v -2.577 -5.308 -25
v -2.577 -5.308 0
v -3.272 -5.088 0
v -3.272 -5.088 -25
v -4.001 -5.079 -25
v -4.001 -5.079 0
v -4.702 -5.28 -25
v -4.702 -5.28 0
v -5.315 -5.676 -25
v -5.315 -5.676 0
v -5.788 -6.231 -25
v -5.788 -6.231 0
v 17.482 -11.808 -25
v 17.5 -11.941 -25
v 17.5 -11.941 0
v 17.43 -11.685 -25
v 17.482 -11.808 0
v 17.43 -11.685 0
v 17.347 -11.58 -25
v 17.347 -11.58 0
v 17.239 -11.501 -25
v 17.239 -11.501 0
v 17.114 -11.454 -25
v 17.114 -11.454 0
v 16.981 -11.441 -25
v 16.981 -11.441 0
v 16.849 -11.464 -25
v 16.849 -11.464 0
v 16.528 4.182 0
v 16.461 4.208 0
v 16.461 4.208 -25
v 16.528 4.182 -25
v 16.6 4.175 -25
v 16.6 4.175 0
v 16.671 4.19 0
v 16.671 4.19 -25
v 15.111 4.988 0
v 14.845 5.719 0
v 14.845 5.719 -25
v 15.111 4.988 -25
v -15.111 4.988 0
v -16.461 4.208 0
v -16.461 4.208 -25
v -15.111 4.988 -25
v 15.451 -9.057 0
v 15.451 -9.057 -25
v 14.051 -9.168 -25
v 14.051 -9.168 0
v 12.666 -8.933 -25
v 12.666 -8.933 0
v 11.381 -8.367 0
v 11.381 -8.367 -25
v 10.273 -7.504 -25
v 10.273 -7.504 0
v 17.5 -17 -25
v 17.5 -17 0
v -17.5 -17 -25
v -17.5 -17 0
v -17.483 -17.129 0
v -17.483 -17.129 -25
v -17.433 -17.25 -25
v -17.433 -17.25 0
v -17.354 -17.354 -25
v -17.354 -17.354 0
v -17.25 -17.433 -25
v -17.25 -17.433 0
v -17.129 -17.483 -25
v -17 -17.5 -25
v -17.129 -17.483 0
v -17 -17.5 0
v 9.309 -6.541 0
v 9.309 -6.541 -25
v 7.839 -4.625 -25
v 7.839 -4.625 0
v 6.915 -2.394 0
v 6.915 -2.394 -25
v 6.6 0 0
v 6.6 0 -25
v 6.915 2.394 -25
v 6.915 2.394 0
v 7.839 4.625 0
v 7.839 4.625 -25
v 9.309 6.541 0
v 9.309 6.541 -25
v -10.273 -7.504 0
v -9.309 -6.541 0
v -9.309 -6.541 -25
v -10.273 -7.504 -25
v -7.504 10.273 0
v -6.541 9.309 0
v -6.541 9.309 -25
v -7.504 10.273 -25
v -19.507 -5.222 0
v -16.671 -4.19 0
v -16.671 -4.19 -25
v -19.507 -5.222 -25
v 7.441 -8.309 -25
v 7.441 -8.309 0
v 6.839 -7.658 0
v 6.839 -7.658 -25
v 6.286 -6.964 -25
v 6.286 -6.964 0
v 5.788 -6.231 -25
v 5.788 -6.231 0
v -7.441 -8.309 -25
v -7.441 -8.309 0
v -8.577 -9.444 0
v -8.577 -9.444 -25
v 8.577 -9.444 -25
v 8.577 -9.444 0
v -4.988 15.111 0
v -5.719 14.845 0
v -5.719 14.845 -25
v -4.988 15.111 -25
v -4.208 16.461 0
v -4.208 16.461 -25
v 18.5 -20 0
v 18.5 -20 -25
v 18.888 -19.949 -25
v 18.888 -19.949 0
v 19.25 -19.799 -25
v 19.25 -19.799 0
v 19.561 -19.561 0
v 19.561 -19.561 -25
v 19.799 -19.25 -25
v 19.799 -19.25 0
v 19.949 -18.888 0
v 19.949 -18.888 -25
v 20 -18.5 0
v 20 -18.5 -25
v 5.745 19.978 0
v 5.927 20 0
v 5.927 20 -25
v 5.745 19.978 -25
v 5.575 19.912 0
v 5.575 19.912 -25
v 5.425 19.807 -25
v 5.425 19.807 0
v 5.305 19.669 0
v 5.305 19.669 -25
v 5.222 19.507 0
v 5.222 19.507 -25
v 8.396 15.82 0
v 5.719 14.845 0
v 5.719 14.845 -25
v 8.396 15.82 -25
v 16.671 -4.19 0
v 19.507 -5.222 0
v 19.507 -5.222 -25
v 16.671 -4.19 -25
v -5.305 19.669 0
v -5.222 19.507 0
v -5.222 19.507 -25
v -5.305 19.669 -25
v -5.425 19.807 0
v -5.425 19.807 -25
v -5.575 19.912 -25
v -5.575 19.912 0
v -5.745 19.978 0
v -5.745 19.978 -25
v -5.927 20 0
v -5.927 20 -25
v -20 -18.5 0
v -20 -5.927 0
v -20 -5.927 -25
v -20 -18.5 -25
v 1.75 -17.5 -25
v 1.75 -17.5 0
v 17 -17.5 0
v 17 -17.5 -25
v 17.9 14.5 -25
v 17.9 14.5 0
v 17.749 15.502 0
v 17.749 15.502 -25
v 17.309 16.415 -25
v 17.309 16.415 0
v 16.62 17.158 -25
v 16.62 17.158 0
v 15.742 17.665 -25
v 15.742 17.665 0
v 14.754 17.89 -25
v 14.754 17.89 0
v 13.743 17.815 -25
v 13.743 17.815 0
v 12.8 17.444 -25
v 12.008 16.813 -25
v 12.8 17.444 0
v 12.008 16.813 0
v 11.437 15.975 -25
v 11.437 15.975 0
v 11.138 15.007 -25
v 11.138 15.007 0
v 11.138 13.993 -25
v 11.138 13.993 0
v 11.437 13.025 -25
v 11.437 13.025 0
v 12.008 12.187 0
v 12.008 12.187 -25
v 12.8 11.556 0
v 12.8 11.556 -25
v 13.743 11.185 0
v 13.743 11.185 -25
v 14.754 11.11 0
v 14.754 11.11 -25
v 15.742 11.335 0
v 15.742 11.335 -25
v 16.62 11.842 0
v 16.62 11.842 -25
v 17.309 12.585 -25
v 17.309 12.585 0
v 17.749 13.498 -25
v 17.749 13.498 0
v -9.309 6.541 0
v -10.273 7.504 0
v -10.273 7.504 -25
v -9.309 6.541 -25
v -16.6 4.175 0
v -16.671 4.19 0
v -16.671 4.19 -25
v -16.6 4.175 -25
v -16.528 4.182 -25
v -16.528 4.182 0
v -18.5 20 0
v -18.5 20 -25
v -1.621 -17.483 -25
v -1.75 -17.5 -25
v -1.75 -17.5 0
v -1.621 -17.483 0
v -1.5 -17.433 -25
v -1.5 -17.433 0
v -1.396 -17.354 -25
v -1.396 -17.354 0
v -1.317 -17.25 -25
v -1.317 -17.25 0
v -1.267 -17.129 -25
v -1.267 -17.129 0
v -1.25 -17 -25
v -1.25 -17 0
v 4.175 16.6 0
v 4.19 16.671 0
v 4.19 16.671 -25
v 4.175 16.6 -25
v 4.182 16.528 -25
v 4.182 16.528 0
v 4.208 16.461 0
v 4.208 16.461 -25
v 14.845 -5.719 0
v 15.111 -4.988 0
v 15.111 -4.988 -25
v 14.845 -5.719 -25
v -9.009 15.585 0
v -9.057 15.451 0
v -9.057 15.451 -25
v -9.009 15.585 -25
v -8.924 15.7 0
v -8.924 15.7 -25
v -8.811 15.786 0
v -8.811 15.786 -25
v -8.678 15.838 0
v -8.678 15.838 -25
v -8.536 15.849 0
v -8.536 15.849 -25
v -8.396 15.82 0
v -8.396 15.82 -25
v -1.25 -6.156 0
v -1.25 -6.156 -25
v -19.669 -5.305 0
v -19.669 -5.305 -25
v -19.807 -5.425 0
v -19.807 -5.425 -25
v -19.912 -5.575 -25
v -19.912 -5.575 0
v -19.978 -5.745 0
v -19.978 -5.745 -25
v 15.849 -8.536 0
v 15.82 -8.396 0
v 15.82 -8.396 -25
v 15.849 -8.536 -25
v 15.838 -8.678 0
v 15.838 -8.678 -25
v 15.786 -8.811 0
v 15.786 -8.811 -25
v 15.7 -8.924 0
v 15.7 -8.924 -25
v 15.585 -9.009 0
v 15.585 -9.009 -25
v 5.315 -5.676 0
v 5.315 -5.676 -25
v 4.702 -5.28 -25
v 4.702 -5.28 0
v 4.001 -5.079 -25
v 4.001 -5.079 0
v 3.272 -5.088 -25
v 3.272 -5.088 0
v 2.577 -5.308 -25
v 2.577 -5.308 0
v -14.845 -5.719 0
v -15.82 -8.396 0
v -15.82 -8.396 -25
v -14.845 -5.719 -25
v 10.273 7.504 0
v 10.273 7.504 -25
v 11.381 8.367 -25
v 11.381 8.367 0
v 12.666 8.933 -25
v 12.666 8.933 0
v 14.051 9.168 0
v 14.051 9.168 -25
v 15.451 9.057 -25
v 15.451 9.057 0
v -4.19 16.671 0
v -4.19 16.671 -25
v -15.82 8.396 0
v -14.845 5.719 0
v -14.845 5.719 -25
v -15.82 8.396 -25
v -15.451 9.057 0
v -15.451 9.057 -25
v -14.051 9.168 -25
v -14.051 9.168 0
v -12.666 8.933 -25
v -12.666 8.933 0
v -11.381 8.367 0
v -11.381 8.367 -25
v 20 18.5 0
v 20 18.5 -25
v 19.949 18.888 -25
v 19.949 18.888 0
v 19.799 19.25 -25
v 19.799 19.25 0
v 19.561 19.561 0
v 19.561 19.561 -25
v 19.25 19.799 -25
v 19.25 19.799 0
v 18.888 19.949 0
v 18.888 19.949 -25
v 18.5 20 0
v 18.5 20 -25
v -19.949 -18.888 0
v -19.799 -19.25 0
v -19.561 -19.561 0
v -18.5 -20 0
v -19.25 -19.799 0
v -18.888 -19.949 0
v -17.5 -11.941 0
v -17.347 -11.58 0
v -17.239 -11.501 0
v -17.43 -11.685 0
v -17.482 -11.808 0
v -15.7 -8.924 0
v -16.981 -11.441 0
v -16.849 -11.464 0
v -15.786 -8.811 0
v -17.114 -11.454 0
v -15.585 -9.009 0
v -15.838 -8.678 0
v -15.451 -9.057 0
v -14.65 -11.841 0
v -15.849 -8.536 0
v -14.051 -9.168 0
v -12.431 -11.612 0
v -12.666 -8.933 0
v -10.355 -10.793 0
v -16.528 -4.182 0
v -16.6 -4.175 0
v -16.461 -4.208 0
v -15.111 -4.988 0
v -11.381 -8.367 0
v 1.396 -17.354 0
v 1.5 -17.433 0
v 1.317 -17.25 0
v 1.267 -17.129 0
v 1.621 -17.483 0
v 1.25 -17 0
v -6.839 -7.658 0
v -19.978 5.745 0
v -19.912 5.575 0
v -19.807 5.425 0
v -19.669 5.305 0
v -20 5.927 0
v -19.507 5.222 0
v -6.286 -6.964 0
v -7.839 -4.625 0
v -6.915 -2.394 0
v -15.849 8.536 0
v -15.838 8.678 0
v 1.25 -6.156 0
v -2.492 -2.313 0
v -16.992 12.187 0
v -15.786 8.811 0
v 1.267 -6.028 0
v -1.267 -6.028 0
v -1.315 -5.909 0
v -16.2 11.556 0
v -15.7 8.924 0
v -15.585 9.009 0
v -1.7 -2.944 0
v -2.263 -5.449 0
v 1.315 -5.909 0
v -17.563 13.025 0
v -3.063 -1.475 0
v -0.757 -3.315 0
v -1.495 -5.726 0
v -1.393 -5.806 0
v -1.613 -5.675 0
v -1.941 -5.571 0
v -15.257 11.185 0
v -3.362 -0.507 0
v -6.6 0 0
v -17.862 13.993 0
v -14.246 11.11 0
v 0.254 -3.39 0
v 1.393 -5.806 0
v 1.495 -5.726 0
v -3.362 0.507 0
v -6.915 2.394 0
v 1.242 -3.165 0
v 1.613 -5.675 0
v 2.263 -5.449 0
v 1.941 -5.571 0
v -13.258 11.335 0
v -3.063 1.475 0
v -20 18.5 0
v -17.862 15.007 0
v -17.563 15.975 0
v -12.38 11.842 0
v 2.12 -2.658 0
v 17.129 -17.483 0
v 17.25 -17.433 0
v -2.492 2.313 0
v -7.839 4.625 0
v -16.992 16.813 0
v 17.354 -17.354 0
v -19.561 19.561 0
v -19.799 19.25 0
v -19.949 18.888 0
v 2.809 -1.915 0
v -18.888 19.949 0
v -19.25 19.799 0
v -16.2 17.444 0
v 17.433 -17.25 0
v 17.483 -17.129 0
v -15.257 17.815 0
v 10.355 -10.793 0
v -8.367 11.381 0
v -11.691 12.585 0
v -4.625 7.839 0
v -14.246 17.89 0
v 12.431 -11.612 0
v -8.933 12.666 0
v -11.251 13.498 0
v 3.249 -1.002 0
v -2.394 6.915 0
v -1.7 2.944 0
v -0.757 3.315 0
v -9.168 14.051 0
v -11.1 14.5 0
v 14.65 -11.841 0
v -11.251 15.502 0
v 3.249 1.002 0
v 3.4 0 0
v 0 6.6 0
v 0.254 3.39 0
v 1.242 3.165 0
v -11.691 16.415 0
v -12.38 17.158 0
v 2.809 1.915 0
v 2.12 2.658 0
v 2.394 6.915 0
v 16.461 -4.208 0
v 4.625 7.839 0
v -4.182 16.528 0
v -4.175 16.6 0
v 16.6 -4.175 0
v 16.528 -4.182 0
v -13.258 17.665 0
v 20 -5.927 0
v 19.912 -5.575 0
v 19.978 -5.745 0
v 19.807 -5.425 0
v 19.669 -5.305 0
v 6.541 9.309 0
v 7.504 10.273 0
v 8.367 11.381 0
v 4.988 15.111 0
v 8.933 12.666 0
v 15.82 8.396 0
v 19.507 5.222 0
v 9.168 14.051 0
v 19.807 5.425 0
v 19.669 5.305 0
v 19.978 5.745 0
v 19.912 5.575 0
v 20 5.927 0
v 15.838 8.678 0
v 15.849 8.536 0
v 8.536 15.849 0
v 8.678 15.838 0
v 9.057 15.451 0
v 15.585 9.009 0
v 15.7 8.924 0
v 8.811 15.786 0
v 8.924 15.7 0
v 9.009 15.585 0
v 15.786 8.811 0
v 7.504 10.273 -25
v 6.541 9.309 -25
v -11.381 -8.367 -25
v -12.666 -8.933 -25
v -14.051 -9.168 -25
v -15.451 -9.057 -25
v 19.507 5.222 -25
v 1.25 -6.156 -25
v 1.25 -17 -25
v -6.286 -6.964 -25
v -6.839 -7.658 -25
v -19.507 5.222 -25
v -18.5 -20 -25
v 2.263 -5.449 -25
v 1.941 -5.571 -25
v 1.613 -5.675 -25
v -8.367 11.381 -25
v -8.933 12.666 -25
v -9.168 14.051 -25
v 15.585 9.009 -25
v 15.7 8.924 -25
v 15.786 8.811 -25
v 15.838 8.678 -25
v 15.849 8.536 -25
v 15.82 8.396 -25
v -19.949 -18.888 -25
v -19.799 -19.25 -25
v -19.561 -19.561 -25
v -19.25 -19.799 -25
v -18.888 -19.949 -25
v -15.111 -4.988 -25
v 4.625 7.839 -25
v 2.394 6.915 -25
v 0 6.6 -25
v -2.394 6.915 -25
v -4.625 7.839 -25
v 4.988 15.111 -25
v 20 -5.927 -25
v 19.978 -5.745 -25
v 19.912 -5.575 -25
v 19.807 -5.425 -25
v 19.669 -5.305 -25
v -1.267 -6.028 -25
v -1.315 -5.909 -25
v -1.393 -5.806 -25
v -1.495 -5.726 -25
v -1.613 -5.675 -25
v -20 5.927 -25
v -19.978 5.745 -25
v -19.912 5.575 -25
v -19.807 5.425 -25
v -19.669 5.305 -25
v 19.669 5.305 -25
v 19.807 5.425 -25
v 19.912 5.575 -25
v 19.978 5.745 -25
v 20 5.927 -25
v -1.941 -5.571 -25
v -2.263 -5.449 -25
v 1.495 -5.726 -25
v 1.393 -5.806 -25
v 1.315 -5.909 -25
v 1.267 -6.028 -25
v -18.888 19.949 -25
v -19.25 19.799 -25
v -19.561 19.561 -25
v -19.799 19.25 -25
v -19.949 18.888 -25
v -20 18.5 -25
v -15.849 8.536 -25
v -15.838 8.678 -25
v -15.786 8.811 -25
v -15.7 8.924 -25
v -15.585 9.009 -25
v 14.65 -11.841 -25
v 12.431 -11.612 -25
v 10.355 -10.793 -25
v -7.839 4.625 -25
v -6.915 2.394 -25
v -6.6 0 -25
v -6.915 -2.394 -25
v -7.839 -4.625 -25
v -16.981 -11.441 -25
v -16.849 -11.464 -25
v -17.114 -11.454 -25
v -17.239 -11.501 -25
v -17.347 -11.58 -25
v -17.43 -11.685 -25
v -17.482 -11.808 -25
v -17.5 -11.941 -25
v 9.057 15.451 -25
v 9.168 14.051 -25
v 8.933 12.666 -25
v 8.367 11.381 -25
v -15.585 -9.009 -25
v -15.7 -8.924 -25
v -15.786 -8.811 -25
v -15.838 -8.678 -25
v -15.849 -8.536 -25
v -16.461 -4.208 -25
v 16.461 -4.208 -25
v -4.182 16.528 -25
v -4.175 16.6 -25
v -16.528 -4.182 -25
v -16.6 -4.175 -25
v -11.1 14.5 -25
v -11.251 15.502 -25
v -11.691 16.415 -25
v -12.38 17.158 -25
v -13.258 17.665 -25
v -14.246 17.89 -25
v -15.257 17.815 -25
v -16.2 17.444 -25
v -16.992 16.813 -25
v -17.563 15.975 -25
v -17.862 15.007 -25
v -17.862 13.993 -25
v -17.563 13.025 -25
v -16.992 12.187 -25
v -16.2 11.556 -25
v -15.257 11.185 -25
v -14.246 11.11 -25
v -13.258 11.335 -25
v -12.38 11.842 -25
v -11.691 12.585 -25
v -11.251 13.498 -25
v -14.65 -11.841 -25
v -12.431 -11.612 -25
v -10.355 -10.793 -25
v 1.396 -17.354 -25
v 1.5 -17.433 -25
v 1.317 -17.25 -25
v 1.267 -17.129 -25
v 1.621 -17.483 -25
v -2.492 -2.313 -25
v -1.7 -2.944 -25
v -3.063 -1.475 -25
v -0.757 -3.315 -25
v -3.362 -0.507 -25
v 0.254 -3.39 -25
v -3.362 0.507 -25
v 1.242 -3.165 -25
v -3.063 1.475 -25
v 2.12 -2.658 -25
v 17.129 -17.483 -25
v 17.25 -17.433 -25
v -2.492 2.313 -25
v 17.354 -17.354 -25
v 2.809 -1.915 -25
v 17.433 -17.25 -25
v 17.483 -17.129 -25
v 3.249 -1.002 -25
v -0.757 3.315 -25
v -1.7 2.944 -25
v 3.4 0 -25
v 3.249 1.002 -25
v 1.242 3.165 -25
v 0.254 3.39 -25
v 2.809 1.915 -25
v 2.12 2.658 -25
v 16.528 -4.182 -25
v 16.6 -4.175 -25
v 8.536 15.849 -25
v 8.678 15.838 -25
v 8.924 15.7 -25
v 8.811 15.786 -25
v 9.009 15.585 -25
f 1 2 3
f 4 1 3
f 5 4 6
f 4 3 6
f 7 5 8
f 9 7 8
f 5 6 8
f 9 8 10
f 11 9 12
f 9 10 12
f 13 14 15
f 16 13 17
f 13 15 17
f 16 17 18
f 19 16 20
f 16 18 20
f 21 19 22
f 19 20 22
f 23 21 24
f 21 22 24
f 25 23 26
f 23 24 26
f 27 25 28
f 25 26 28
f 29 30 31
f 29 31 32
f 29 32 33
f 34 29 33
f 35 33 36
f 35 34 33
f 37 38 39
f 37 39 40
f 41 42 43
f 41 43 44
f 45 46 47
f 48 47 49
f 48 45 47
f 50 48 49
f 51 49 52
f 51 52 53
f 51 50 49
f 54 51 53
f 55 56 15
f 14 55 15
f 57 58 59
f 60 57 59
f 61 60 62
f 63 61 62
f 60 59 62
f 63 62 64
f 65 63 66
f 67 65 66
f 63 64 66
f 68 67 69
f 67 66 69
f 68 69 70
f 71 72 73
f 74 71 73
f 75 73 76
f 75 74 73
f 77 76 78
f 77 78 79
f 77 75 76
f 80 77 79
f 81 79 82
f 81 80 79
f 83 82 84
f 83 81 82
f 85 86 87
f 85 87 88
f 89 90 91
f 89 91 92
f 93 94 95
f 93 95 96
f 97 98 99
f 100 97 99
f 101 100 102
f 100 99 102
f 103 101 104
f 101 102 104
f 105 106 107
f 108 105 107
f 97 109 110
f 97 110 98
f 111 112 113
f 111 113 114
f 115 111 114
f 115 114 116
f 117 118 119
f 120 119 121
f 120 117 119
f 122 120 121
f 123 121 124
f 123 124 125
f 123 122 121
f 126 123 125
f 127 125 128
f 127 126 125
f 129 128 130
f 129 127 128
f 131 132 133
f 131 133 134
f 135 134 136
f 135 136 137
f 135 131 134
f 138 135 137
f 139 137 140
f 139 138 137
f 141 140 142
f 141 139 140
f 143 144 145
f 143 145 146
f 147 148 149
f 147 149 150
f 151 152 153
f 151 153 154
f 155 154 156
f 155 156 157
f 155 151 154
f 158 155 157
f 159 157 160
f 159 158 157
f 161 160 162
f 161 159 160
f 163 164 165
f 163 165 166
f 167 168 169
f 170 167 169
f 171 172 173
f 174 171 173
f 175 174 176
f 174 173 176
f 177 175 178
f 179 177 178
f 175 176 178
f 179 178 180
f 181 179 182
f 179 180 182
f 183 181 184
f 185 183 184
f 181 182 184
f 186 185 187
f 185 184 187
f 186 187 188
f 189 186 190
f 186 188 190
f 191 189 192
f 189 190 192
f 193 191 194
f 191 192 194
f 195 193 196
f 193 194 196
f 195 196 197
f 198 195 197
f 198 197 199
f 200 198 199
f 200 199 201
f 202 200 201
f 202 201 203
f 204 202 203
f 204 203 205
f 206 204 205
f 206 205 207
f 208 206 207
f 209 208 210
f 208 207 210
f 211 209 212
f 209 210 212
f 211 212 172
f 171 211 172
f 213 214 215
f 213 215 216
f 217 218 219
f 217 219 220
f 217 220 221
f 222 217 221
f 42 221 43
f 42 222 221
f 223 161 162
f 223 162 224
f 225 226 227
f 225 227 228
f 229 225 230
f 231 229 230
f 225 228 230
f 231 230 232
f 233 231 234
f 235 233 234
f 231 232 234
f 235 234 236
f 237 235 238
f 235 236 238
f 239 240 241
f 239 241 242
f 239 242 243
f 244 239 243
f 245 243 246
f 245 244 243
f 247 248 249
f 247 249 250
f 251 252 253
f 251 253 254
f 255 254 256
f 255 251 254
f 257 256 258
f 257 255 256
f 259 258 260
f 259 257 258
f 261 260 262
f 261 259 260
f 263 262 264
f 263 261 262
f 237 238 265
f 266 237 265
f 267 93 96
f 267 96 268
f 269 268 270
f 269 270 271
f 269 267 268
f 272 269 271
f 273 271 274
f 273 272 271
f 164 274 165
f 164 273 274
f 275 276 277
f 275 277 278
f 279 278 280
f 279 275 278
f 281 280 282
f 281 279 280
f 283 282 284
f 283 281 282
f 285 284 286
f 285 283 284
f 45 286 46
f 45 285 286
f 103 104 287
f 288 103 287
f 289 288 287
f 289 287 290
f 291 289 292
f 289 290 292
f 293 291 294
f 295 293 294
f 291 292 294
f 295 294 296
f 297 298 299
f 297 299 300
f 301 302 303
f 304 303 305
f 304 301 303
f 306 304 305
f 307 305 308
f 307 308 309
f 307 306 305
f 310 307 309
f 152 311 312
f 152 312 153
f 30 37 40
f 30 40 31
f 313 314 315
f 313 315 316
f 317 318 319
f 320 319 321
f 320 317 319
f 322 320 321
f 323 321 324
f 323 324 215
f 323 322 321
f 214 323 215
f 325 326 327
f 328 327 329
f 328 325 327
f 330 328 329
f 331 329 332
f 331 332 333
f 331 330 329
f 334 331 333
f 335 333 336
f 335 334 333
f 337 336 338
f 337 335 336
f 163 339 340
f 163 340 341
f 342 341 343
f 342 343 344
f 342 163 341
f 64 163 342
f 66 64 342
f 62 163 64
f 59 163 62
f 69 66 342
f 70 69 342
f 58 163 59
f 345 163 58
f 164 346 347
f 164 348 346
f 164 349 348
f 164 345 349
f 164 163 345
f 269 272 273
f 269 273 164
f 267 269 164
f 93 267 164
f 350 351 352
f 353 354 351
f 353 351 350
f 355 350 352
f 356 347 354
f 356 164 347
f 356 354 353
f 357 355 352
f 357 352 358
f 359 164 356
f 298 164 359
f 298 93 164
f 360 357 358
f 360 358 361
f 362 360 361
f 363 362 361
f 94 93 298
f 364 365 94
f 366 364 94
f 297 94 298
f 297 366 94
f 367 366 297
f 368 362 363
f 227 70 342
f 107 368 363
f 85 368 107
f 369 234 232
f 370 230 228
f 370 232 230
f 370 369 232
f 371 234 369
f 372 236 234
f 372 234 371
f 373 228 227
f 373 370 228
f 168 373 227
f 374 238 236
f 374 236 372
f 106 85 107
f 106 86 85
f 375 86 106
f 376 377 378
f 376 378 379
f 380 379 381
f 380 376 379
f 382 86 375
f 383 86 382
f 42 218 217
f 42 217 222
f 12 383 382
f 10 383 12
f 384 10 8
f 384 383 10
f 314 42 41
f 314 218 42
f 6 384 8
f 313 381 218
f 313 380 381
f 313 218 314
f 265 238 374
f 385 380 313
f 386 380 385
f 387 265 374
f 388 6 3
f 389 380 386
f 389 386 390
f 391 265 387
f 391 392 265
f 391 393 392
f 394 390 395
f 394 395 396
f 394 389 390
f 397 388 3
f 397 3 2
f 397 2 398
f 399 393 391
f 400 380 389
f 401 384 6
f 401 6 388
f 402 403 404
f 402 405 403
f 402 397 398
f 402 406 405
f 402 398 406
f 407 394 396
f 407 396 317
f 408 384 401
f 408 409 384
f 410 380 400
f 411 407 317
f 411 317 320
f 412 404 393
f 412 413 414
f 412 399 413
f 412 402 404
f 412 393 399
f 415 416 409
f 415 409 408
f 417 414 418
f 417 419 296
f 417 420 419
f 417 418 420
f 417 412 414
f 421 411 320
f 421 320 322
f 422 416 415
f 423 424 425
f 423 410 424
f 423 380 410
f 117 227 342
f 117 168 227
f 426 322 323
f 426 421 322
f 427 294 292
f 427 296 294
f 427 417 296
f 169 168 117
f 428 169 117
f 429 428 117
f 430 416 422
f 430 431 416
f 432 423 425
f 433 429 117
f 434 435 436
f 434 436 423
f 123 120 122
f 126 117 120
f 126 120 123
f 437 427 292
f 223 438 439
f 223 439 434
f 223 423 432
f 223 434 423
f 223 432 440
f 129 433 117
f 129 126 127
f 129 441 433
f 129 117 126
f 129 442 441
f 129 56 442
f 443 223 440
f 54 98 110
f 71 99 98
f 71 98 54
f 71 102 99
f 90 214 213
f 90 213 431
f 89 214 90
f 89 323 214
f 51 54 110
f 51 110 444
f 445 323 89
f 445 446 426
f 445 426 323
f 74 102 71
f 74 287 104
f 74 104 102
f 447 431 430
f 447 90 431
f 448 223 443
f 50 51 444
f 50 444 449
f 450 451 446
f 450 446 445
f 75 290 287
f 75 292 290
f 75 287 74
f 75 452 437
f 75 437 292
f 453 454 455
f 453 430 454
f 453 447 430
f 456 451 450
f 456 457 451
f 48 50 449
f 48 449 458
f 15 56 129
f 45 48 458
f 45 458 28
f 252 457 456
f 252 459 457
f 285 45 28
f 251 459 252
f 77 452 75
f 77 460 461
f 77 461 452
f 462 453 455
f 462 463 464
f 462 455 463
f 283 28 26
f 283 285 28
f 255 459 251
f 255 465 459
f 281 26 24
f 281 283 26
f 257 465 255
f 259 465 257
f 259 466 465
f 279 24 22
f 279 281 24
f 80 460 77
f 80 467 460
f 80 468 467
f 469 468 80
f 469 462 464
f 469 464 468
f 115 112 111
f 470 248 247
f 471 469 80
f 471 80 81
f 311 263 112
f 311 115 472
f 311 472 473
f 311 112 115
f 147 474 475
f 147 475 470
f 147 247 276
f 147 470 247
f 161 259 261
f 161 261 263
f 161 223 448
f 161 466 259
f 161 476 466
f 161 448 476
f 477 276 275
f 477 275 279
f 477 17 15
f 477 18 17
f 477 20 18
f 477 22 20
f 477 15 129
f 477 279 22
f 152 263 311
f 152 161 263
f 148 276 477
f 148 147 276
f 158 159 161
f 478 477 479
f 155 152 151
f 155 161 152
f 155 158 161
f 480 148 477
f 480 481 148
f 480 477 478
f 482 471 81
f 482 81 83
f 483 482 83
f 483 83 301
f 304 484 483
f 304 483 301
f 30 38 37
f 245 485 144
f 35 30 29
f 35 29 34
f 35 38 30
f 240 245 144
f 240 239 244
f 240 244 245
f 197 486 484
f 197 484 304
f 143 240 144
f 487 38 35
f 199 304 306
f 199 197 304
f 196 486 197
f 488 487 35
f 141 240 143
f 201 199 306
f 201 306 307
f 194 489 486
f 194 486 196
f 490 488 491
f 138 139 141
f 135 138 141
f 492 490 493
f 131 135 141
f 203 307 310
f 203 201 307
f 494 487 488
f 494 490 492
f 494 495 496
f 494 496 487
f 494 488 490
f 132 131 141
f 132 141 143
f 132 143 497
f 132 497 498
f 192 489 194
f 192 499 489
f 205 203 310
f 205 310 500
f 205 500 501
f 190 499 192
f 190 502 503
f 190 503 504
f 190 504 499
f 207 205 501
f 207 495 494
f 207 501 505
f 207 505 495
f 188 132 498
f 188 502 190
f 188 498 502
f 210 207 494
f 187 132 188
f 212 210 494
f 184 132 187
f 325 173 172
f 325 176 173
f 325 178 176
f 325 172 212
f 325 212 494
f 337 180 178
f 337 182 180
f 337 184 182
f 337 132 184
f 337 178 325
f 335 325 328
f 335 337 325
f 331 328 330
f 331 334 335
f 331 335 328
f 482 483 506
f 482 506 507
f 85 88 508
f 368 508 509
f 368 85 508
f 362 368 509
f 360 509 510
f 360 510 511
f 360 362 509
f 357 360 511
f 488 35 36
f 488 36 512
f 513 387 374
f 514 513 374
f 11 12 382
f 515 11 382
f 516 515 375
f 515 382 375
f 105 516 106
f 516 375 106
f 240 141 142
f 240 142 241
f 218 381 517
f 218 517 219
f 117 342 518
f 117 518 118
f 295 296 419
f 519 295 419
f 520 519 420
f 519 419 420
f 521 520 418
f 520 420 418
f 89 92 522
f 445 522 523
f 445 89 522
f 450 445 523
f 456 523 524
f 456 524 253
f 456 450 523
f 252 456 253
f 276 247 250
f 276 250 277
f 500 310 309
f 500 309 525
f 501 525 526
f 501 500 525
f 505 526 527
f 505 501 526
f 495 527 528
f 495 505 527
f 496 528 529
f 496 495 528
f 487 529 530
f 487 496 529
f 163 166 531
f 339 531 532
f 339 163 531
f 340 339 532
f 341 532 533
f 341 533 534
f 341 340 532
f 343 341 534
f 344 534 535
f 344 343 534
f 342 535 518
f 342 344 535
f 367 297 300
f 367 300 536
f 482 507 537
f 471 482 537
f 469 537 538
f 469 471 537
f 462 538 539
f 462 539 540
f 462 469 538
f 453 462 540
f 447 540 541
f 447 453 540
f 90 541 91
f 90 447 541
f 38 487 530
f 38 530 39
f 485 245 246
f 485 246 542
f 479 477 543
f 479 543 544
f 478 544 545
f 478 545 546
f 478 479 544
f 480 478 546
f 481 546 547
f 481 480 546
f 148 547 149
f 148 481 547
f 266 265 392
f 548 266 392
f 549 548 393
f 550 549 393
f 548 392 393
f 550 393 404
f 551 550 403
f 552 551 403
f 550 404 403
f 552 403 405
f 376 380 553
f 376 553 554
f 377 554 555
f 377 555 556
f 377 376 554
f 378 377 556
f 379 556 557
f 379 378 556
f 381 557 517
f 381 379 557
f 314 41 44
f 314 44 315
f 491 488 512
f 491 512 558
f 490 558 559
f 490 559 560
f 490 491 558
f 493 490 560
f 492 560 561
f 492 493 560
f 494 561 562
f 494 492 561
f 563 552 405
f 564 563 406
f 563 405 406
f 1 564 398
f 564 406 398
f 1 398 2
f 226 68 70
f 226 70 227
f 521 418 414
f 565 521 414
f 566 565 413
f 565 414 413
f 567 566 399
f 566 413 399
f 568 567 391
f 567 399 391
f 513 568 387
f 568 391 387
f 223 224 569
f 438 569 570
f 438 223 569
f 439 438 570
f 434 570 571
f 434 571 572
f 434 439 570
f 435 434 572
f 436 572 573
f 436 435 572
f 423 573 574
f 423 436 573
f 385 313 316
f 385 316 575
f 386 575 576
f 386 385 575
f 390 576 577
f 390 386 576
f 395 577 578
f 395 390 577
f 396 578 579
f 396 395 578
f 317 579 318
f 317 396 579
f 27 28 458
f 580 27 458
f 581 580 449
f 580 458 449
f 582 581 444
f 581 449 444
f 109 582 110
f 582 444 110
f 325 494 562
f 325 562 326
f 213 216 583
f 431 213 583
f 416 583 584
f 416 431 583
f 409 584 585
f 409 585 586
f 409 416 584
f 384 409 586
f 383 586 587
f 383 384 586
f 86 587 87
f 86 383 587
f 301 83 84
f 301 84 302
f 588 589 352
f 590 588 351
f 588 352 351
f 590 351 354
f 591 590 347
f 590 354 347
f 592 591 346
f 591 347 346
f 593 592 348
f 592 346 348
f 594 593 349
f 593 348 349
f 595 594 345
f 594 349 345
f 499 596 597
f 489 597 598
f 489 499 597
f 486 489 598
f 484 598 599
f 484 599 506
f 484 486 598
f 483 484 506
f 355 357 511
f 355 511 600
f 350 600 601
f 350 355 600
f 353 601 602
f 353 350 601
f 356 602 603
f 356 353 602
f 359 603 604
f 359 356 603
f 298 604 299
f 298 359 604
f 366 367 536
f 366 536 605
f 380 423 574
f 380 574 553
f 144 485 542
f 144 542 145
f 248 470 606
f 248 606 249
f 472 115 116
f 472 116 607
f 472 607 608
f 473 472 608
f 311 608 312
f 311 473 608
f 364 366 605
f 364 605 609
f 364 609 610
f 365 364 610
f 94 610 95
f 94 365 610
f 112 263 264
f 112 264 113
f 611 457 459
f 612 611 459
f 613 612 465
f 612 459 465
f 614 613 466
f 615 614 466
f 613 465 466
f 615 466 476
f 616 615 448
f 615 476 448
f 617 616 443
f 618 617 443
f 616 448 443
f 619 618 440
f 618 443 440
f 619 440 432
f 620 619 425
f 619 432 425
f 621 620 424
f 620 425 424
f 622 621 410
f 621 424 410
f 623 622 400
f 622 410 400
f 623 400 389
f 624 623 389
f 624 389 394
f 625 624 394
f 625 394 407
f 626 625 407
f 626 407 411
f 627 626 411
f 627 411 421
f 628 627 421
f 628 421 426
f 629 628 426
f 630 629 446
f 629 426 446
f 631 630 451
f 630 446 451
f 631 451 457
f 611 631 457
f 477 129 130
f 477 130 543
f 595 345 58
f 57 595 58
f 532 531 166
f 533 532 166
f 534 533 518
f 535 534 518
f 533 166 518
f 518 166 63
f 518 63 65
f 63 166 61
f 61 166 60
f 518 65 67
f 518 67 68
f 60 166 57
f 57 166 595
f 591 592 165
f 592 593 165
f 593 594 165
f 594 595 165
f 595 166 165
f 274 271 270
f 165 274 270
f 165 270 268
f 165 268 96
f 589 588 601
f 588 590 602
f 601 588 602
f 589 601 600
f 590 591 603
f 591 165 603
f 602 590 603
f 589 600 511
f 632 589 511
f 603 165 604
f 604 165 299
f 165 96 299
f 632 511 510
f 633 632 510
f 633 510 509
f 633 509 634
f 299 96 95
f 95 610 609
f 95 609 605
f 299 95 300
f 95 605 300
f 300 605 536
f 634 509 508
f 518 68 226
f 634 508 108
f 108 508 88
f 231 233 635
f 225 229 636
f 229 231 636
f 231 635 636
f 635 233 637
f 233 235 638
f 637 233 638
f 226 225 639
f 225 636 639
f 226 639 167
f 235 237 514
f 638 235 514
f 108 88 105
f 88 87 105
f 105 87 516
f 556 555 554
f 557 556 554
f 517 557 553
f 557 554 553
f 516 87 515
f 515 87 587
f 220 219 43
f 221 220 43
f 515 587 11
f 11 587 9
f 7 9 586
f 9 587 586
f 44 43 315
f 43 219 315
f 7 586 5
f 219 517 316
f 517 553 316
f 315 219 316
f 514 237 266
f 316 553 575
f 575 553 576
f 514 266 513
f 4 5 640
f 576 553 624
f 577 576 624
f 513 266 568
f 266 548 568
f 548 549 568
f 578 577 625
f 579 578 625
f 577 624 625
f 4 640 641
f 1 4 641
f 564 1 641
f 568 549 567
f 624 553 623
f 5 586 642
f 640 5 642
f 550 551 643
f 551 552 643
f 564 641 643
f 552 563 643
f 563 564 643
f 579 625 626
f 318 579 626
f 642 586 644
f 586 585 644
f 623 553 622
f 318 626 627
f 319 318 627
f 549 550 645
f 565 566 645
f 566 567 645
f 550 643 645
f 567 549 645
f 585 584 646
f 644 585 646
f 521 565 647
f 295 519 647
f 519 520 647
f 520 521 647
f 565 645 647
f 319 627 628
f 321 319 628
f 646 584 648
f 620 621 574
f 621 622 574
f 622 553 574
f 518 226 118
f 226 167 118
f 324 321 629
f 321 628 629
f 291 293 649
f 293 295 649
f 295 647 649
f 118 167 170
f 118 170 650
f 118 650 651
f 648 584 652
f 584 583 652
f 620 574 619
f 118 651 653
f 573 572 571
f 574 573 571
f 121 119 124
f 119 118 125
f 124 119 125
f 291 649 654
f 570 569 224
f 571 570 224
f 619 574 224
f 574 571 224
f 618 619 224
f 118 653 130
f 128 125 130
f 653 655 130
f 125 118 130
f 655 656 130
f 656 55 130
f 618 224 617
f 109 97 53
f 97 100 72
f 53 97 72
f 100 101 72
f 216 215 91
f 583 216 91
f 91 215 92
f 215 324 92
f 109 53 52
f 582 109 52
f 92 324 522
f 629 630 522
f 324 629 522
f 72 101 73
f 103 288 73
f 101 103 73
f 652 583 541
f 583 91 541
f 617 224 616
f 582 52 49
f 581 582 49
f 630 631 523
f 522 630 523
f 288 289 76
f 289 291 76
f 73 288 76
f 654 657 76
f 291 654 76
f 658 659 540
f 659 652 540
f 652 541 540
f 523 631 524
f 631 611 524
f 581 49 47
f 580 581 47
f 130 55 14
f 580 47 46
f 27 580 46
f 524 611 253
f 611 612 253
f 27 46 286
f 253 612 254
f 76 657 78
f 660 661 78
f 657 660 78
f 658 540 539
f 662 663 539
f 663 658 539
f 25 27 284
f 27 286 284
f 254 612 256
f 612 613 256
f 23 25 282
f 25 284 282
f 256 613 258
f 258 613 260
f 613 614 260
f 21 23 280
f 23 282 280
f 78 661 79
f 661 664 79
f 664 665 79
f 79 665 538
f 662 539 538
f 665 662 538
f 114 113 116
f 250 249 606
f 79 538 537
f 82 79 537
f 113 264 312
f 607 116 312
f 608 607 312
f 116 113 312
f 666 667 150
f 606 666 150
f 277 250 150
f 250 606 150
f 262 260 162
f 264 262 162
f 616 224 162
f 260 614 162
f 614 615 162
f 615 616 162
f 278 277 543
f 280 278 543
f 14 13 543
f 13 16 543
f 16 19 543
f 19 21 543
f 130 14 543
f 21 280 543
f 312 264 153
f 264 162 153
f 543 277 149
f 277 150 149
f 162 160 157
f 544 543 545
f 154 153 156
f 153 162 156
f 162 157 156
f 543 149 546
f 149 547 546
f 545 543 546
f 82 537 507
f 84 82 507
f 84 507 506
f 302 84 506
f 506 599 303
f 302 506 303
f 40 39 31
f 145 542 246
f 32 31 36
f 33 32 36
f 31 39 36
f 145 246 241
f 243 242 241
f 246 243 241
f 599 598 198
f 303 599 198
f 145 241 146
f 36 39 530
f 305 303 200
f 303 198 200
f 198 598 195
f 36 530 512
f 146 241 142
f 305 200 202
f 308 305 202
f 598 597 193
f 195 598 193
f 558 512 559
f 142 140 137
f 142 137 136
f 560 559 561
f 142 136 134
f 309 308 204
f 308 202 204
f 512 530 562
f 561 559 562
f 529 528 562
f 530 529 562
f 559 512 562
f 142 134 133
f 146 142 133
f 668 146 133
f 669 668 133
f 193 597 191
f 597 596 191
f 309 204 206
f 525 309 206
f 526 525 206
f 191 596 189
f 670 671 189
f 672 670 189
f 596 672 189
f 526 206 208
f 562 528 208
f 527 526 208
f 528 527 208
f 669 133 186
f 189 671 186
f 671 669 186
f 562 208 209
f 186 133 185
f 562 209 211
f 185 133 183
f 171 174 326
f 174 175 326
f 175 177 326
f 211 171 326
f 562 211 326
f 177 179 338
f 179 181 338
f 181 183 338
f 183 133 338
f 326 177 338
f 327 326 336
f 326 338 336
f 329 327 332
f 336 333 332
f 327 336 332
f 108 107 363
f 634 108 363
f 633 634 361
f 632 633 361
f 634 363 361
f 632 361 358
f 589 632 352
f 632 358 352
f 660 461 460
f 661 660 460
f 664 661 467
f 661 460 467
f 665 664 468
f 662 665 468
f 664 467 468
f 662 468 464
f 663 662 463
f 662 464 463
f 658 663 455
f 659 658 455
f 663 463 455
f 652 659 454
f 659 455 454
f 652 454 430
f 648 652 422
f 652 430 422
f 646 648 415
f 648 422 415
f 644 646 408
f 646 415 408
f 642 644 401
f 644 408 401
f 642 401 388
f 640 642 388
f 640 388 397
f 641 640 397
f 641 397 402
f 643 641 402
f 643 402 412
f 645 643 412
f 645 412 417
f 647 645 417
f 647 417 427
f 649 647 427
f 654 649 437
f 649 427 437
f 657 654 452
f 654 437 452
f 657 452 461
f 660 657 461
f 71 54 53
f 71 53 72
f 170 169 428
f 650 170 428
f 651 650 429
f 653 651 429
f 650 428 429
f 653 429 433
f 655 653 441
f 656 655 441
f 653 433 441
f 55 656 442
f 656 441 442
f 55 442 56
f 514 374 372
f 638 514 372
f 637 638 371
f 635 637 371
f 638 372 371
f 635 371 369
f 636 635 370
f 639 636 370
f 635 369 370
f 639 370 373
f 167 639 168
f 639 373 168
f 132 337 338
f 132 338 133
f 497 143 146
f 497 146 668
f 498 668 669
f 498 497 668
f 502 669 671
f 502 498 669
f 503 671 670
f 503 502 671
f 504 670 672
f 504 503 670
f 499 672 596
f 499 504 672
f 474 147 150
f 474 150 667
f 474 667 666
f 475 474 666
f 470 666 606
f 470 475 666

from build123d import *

# Parameters (mm, degrees)
SK_MAIN_EXTRUSION_R  = 3.4
MAIN_EXTRUSION_DEPTH = 25


with BuildPart() as part:
    # Sk Main Extrusion → Main Extrusion (new body)
    with BuildSketch(Plane.XY):
        with BuildLine():
            Line((-16.671180212, -4.190076845), (-19.506515107, -5.222054351))
            ThreePointArc((-19.506515107, -5.222054351), (-19.864364033, -5.496641489), (-20, -5.926823816))
            Line((-20, -5.926823816), (-20, -18.5))
            ThreePointArc((-20, -18.5), (-19.560660172, -19.560660172), (-18.5, -20))
            Line((-18.5, -20), (18.5, -20))
            ThreePointArc((18.5, -20), (19.560660172, -19.560660172), (20, -18.5))
            Line((20, -18.5), (20, -5.926823816))
            ThreePointArc((20, -5.926823816), (19.864364033, -5.496641489), (19.506515107, -5.222054351))
            Line((19.506515107, -5.222054351), (16.671180212, -4.190076845))
            ThreePointArc((16.671180212, -4.190076845), (16.563886241, -4.175951325), (16.460675177, -4.208493649))
            Line((16.460675177, -4.208493649), (15.111296024, -4.987558066))
            Line((15.111296024, -4.987558066), (14.845251581, -5.718509166))
            Line((14.845251581, -5.718509166), (15.81984631, -8.396186179))
            ThreePointArc((15.81984631, -8.396186179), (15.786489799, -8.811074612), (15.450654467, -9.056960151))
            ThreePointArc((15.450654467, -9.056960151), (12.665882372, -8.933433013), (10.272684887, -7.504160339))
            Line((10.272684887, -7.504160339), (9.309262274, -6.540737726))
            ThreePointArc((9.309262274, -6.540737726), (6.6, 0), (9.309262274, 6.540737726))
            Line((9.309262274, 6.540737726), (10.272684887, 7.504160339))
            ThreePointArc((10.272684887, 7.504160339), (12.665882372, 8.933433013), (15.450654467, 9.056960151))
            ThreePointArc((15.450654467, 9.056960151), (15.786489799, 8.811074612), (15.81984631, 8.396186179))
            Line((15.81984631, 8.396186179), (14.845251581, 5.718509166))
            Line((14.845251581, 5.718509166), (15.111296024, 4.987558066))
            Line((15.111296024, 4.987558066), (16.460675177, 4.208493649))
            ThreePointArc((16.460675177, 4.208493649), (16.563886241, 4.175951325), (16.671180212, 4.190076845))
            Line((16.671180212, 4.190076845), (19.506515107, 5.222054351))
            ThreePointArc((19.506515107, 5.222054351), (19.864364033, 5.496641489), (20, 5.926823816))
            Line((20, 5.926823816), (20, 18.5))
            ThreePointArc((20, 18.5), (19.560660172, 19.560660172), (18.5, 20))
            Line((18.5, 20), (5.926823816, 20))
            ThreePointArc((5.926823816, 20), (5.496641489, 19.864364033), (5.222054351, 19.506515107))
            Line((5.222054351, 19.506515107), (4.190076845, 16.671180212))
            ThreePointArc((4.190076845, 16.671180212), (4.175951325, 16.563886241), (4.208493649, 16.460675177))
            Line((4.208493649, 16.460675177), (4.987558066, 15.111296024))
            Line((4.987558066, 15.111296024), (5.718509166, 14.845251581))
            Line((5.718509166, 14.845251581), (8.396186179, 15.81984631))
            ThreePointArc((8.396186179, 15.81984631), (8.811074612, 15.786489799), (9.056960151, 15.450654467))
            ThreePointArc((9.056960151, 15.450654467), (8.933433013, 12.665882372), (7.504160339, 10.272684887))
            Line((7.504160339, 10.272684887), (6.540737726, 9.309262274))
            ThreePointArc((6.540737726, 9.309262274), (0, 6.6), (-6.540737726, 9.309262274))
            Line((-6.540737726, 9.309262274), (-7.504160339, 10.272684887))
            ThreePointArc((-7.504160339, 10.272684887), (-8.933433013, 12.665882372), (-9.056960151, 15.450654467))
            ThreePointArc((-9.056960151, 15.450654467), (-8.811074612, 15.786489799), (-8.396186179, 15.81984631))
            Line((-8.396186179, 15.81984631), (-5.718509166, 14.845251581))
            Line((-5.718509166, 14.845251581), (-4.987558066, 15.111296024))
            Line((-4.987558066, 15.111296024), (-4.208493649, 16.460675177))
            ThreePointArc((-4.208493649, 16.460675177), (-4.175951325, 16.563886241), (-4.190076845, 16.671180212))
            Line((-4.190076845, 16.671180212), (-5.222054351, 19.506515107))
            ThreePointArc((-5.222054351, 19.506515107), (-5.496641489, 19.864364033), (-5.926823816, 20))
            Line((-5.926823816, 20), (-18.5, 20))
            ThreePointArc((-18.5, 20), (-19.560660172, 19.560660172), (-20, 18.5))
            Line((-20, 18.5), (-20, 5.926823816))
            ThreePointArc((-20, 5.926823816), (-19.864364033, 5.496641489), (-19.506515107, 5.222054351))
            Line((-19.506515107, 5.222054351), (-16.671180212, 4.190076845))
            ThreePointArc((-16.671180212, 4.190076845), (-16.563886241, 4.175951325), (-16.460675177, 4.208493649))
            Line((-16.460675177, 4.208493649), (-15.111296024, 4.987558066))
            Line((-15.111296024, 4.987558066), (-14.845251581, 5.718509166))
            Line((-14.845251581, 5.718509166), (-15.81984631, 8.396186179))
            ThreePointArc((-15.81984631, 8.396186179), (-15.786489799, 8.811074612), (-15.450654467, 9.056960151))
            ThreePointArc((-15.450654467, 9.056960151), (-12.665882372, 8.933433013), (-10.272684887, 7.504160339))
            Line((-10.272684887, 7.504160339), (-9.309262274, 6.540737726))
            ThreePointArc((-9.309262274, 6.540737726), (-6.6, 0), (-9.309262274, -6.540737726))
            Line((-9.309262274, -6.540737726), (-10.272684887, -7.504160339))
            ThreePointArc((-10.272684887, -7.504160339), (-12.665882372, -8.933433013), (-15.450654467, -9.056960151))
            ThreePointArc((-15.450654467, -9.056960151), (-15.786489799, -8.811074612), (-15.81984631, -8.396186179))
            Line((-15.81984631, -8.396186179), (-14.845251581, -5.718509166))
            Line((-14.845251581, -5.718509166), (-15.111296024, -4.987558066))
            Line((-15.111296024, -4.987558066), (-16.460675177, -4.208493649))
            ThreePointArc((-16.460675177, -4.208493649), (-16.563886241, -4.175951325), (-16.671180212, -4.190076845))
        make_face()
        with Locations((14.5, 14.5)):
            Circle(SK_MAIN_EXTRUSION_R, mode=Mode.SUBTRACT)
        Circle(SK_MAIN_EXTRUSION_R, mode=Mode.SUBTRACT)
        with Locations((-14.5, 14.5)):
            Circle(SK_MAIN_EXTRUSION_R, mode=Mode.SUBTRACT)
        with BuildLine():
            Line((-7.441495321, -8.308504679), (-8.577273231, -9.444282589))
            ThreePointArc((-8.577273231, -9.444282589), (-12.430514315, -11.611987193), (-16.849169473, -11.464011904))
            ThreePointArc((-16.849169473, -11.464011904), (-17.295452819, -11.537349181), (-17.5, -11.940719521))
            Line((-17.5, -11.940719521), (-17.5, -17))
            ThreePointArc((-17.5, -17), (-17.353553391, -17.353553391), (-17, -17.5))
            Line((-17, -17.5), (-1.75, -17.5))
            ThreePointArc((-1.75, -17.5), (-1.396446609, -17.353553391), (-1.25, -17))
            Line((-1.25, -17), (-1.25, -6.156094541))
            ThreePointArc((-1.25, -6.156094541), (-1.351026708, -5.854730455), (-1.61328125, -5.675149655))
            ThreePointArc((-1.61328125, -5.675149655), (-2.10305366, -5.51245547), (-2.576734694, -5.307583096))
            ThreePointArc((-2.576734694, -5.307583096), (-4.359333373, -5.153883821), (-5.788120301, -6.230846881))
            ThreePointArc((-5.788120301, -6.230846881), (-6.555931161, -7.316529108), (-7.441495321, -8.308504679))
        make_face(mode=Mode.SUBTRACT)
        with BuildLine():
            Line((1.25, -6.156094541), (1.25, -17))
            ThreePointArc((1.25, -17), (1.396446609, -17.353553391), (1.75, -17.5))
            Line((1.75, -17.5), (17, -17.5))
            ThreePointArc((17, -17.5), (17.353553391, -17.353553391), (17.5, -17))
            Line((17.5, -17), (17.5, -11.940719521))
            ThreePointArc((17.5, -11.940719521), (17.295452819, -11.537349181), (16.849169473, -11.464011904))
            ThreePointArc((16.849169473, -11.464011904), (12.430514315, -11.611987193), (8.577273231, -9.444282589))
            Line((8.577273231, -9.444282589), (7.441495321, -8.308504679))
            ThreePointArc((7.441495321, -8.308504679), (6.555931161, -7.316529108), (5.788120301, -6.230846881))
            ThreePointArc((5.788120301, -6.230846881), (4.359333373, -5.153883821), (2.576734694, -5.307583096))
            ThreePointArc((2.576734694, -5.307583096), (2.10305366, -5.51245547), (1.61328125, -5.675149655))
            ThreePointArc((1.61328125, -5.675149655), (1.351026708, -5.854730455), (1.25, -6.156094541))
        make_face(mode=Mode.SUBTRACT)
    extrude(amount=-MAIN_EXTRUSION_DEPTH)


solid = part.part
